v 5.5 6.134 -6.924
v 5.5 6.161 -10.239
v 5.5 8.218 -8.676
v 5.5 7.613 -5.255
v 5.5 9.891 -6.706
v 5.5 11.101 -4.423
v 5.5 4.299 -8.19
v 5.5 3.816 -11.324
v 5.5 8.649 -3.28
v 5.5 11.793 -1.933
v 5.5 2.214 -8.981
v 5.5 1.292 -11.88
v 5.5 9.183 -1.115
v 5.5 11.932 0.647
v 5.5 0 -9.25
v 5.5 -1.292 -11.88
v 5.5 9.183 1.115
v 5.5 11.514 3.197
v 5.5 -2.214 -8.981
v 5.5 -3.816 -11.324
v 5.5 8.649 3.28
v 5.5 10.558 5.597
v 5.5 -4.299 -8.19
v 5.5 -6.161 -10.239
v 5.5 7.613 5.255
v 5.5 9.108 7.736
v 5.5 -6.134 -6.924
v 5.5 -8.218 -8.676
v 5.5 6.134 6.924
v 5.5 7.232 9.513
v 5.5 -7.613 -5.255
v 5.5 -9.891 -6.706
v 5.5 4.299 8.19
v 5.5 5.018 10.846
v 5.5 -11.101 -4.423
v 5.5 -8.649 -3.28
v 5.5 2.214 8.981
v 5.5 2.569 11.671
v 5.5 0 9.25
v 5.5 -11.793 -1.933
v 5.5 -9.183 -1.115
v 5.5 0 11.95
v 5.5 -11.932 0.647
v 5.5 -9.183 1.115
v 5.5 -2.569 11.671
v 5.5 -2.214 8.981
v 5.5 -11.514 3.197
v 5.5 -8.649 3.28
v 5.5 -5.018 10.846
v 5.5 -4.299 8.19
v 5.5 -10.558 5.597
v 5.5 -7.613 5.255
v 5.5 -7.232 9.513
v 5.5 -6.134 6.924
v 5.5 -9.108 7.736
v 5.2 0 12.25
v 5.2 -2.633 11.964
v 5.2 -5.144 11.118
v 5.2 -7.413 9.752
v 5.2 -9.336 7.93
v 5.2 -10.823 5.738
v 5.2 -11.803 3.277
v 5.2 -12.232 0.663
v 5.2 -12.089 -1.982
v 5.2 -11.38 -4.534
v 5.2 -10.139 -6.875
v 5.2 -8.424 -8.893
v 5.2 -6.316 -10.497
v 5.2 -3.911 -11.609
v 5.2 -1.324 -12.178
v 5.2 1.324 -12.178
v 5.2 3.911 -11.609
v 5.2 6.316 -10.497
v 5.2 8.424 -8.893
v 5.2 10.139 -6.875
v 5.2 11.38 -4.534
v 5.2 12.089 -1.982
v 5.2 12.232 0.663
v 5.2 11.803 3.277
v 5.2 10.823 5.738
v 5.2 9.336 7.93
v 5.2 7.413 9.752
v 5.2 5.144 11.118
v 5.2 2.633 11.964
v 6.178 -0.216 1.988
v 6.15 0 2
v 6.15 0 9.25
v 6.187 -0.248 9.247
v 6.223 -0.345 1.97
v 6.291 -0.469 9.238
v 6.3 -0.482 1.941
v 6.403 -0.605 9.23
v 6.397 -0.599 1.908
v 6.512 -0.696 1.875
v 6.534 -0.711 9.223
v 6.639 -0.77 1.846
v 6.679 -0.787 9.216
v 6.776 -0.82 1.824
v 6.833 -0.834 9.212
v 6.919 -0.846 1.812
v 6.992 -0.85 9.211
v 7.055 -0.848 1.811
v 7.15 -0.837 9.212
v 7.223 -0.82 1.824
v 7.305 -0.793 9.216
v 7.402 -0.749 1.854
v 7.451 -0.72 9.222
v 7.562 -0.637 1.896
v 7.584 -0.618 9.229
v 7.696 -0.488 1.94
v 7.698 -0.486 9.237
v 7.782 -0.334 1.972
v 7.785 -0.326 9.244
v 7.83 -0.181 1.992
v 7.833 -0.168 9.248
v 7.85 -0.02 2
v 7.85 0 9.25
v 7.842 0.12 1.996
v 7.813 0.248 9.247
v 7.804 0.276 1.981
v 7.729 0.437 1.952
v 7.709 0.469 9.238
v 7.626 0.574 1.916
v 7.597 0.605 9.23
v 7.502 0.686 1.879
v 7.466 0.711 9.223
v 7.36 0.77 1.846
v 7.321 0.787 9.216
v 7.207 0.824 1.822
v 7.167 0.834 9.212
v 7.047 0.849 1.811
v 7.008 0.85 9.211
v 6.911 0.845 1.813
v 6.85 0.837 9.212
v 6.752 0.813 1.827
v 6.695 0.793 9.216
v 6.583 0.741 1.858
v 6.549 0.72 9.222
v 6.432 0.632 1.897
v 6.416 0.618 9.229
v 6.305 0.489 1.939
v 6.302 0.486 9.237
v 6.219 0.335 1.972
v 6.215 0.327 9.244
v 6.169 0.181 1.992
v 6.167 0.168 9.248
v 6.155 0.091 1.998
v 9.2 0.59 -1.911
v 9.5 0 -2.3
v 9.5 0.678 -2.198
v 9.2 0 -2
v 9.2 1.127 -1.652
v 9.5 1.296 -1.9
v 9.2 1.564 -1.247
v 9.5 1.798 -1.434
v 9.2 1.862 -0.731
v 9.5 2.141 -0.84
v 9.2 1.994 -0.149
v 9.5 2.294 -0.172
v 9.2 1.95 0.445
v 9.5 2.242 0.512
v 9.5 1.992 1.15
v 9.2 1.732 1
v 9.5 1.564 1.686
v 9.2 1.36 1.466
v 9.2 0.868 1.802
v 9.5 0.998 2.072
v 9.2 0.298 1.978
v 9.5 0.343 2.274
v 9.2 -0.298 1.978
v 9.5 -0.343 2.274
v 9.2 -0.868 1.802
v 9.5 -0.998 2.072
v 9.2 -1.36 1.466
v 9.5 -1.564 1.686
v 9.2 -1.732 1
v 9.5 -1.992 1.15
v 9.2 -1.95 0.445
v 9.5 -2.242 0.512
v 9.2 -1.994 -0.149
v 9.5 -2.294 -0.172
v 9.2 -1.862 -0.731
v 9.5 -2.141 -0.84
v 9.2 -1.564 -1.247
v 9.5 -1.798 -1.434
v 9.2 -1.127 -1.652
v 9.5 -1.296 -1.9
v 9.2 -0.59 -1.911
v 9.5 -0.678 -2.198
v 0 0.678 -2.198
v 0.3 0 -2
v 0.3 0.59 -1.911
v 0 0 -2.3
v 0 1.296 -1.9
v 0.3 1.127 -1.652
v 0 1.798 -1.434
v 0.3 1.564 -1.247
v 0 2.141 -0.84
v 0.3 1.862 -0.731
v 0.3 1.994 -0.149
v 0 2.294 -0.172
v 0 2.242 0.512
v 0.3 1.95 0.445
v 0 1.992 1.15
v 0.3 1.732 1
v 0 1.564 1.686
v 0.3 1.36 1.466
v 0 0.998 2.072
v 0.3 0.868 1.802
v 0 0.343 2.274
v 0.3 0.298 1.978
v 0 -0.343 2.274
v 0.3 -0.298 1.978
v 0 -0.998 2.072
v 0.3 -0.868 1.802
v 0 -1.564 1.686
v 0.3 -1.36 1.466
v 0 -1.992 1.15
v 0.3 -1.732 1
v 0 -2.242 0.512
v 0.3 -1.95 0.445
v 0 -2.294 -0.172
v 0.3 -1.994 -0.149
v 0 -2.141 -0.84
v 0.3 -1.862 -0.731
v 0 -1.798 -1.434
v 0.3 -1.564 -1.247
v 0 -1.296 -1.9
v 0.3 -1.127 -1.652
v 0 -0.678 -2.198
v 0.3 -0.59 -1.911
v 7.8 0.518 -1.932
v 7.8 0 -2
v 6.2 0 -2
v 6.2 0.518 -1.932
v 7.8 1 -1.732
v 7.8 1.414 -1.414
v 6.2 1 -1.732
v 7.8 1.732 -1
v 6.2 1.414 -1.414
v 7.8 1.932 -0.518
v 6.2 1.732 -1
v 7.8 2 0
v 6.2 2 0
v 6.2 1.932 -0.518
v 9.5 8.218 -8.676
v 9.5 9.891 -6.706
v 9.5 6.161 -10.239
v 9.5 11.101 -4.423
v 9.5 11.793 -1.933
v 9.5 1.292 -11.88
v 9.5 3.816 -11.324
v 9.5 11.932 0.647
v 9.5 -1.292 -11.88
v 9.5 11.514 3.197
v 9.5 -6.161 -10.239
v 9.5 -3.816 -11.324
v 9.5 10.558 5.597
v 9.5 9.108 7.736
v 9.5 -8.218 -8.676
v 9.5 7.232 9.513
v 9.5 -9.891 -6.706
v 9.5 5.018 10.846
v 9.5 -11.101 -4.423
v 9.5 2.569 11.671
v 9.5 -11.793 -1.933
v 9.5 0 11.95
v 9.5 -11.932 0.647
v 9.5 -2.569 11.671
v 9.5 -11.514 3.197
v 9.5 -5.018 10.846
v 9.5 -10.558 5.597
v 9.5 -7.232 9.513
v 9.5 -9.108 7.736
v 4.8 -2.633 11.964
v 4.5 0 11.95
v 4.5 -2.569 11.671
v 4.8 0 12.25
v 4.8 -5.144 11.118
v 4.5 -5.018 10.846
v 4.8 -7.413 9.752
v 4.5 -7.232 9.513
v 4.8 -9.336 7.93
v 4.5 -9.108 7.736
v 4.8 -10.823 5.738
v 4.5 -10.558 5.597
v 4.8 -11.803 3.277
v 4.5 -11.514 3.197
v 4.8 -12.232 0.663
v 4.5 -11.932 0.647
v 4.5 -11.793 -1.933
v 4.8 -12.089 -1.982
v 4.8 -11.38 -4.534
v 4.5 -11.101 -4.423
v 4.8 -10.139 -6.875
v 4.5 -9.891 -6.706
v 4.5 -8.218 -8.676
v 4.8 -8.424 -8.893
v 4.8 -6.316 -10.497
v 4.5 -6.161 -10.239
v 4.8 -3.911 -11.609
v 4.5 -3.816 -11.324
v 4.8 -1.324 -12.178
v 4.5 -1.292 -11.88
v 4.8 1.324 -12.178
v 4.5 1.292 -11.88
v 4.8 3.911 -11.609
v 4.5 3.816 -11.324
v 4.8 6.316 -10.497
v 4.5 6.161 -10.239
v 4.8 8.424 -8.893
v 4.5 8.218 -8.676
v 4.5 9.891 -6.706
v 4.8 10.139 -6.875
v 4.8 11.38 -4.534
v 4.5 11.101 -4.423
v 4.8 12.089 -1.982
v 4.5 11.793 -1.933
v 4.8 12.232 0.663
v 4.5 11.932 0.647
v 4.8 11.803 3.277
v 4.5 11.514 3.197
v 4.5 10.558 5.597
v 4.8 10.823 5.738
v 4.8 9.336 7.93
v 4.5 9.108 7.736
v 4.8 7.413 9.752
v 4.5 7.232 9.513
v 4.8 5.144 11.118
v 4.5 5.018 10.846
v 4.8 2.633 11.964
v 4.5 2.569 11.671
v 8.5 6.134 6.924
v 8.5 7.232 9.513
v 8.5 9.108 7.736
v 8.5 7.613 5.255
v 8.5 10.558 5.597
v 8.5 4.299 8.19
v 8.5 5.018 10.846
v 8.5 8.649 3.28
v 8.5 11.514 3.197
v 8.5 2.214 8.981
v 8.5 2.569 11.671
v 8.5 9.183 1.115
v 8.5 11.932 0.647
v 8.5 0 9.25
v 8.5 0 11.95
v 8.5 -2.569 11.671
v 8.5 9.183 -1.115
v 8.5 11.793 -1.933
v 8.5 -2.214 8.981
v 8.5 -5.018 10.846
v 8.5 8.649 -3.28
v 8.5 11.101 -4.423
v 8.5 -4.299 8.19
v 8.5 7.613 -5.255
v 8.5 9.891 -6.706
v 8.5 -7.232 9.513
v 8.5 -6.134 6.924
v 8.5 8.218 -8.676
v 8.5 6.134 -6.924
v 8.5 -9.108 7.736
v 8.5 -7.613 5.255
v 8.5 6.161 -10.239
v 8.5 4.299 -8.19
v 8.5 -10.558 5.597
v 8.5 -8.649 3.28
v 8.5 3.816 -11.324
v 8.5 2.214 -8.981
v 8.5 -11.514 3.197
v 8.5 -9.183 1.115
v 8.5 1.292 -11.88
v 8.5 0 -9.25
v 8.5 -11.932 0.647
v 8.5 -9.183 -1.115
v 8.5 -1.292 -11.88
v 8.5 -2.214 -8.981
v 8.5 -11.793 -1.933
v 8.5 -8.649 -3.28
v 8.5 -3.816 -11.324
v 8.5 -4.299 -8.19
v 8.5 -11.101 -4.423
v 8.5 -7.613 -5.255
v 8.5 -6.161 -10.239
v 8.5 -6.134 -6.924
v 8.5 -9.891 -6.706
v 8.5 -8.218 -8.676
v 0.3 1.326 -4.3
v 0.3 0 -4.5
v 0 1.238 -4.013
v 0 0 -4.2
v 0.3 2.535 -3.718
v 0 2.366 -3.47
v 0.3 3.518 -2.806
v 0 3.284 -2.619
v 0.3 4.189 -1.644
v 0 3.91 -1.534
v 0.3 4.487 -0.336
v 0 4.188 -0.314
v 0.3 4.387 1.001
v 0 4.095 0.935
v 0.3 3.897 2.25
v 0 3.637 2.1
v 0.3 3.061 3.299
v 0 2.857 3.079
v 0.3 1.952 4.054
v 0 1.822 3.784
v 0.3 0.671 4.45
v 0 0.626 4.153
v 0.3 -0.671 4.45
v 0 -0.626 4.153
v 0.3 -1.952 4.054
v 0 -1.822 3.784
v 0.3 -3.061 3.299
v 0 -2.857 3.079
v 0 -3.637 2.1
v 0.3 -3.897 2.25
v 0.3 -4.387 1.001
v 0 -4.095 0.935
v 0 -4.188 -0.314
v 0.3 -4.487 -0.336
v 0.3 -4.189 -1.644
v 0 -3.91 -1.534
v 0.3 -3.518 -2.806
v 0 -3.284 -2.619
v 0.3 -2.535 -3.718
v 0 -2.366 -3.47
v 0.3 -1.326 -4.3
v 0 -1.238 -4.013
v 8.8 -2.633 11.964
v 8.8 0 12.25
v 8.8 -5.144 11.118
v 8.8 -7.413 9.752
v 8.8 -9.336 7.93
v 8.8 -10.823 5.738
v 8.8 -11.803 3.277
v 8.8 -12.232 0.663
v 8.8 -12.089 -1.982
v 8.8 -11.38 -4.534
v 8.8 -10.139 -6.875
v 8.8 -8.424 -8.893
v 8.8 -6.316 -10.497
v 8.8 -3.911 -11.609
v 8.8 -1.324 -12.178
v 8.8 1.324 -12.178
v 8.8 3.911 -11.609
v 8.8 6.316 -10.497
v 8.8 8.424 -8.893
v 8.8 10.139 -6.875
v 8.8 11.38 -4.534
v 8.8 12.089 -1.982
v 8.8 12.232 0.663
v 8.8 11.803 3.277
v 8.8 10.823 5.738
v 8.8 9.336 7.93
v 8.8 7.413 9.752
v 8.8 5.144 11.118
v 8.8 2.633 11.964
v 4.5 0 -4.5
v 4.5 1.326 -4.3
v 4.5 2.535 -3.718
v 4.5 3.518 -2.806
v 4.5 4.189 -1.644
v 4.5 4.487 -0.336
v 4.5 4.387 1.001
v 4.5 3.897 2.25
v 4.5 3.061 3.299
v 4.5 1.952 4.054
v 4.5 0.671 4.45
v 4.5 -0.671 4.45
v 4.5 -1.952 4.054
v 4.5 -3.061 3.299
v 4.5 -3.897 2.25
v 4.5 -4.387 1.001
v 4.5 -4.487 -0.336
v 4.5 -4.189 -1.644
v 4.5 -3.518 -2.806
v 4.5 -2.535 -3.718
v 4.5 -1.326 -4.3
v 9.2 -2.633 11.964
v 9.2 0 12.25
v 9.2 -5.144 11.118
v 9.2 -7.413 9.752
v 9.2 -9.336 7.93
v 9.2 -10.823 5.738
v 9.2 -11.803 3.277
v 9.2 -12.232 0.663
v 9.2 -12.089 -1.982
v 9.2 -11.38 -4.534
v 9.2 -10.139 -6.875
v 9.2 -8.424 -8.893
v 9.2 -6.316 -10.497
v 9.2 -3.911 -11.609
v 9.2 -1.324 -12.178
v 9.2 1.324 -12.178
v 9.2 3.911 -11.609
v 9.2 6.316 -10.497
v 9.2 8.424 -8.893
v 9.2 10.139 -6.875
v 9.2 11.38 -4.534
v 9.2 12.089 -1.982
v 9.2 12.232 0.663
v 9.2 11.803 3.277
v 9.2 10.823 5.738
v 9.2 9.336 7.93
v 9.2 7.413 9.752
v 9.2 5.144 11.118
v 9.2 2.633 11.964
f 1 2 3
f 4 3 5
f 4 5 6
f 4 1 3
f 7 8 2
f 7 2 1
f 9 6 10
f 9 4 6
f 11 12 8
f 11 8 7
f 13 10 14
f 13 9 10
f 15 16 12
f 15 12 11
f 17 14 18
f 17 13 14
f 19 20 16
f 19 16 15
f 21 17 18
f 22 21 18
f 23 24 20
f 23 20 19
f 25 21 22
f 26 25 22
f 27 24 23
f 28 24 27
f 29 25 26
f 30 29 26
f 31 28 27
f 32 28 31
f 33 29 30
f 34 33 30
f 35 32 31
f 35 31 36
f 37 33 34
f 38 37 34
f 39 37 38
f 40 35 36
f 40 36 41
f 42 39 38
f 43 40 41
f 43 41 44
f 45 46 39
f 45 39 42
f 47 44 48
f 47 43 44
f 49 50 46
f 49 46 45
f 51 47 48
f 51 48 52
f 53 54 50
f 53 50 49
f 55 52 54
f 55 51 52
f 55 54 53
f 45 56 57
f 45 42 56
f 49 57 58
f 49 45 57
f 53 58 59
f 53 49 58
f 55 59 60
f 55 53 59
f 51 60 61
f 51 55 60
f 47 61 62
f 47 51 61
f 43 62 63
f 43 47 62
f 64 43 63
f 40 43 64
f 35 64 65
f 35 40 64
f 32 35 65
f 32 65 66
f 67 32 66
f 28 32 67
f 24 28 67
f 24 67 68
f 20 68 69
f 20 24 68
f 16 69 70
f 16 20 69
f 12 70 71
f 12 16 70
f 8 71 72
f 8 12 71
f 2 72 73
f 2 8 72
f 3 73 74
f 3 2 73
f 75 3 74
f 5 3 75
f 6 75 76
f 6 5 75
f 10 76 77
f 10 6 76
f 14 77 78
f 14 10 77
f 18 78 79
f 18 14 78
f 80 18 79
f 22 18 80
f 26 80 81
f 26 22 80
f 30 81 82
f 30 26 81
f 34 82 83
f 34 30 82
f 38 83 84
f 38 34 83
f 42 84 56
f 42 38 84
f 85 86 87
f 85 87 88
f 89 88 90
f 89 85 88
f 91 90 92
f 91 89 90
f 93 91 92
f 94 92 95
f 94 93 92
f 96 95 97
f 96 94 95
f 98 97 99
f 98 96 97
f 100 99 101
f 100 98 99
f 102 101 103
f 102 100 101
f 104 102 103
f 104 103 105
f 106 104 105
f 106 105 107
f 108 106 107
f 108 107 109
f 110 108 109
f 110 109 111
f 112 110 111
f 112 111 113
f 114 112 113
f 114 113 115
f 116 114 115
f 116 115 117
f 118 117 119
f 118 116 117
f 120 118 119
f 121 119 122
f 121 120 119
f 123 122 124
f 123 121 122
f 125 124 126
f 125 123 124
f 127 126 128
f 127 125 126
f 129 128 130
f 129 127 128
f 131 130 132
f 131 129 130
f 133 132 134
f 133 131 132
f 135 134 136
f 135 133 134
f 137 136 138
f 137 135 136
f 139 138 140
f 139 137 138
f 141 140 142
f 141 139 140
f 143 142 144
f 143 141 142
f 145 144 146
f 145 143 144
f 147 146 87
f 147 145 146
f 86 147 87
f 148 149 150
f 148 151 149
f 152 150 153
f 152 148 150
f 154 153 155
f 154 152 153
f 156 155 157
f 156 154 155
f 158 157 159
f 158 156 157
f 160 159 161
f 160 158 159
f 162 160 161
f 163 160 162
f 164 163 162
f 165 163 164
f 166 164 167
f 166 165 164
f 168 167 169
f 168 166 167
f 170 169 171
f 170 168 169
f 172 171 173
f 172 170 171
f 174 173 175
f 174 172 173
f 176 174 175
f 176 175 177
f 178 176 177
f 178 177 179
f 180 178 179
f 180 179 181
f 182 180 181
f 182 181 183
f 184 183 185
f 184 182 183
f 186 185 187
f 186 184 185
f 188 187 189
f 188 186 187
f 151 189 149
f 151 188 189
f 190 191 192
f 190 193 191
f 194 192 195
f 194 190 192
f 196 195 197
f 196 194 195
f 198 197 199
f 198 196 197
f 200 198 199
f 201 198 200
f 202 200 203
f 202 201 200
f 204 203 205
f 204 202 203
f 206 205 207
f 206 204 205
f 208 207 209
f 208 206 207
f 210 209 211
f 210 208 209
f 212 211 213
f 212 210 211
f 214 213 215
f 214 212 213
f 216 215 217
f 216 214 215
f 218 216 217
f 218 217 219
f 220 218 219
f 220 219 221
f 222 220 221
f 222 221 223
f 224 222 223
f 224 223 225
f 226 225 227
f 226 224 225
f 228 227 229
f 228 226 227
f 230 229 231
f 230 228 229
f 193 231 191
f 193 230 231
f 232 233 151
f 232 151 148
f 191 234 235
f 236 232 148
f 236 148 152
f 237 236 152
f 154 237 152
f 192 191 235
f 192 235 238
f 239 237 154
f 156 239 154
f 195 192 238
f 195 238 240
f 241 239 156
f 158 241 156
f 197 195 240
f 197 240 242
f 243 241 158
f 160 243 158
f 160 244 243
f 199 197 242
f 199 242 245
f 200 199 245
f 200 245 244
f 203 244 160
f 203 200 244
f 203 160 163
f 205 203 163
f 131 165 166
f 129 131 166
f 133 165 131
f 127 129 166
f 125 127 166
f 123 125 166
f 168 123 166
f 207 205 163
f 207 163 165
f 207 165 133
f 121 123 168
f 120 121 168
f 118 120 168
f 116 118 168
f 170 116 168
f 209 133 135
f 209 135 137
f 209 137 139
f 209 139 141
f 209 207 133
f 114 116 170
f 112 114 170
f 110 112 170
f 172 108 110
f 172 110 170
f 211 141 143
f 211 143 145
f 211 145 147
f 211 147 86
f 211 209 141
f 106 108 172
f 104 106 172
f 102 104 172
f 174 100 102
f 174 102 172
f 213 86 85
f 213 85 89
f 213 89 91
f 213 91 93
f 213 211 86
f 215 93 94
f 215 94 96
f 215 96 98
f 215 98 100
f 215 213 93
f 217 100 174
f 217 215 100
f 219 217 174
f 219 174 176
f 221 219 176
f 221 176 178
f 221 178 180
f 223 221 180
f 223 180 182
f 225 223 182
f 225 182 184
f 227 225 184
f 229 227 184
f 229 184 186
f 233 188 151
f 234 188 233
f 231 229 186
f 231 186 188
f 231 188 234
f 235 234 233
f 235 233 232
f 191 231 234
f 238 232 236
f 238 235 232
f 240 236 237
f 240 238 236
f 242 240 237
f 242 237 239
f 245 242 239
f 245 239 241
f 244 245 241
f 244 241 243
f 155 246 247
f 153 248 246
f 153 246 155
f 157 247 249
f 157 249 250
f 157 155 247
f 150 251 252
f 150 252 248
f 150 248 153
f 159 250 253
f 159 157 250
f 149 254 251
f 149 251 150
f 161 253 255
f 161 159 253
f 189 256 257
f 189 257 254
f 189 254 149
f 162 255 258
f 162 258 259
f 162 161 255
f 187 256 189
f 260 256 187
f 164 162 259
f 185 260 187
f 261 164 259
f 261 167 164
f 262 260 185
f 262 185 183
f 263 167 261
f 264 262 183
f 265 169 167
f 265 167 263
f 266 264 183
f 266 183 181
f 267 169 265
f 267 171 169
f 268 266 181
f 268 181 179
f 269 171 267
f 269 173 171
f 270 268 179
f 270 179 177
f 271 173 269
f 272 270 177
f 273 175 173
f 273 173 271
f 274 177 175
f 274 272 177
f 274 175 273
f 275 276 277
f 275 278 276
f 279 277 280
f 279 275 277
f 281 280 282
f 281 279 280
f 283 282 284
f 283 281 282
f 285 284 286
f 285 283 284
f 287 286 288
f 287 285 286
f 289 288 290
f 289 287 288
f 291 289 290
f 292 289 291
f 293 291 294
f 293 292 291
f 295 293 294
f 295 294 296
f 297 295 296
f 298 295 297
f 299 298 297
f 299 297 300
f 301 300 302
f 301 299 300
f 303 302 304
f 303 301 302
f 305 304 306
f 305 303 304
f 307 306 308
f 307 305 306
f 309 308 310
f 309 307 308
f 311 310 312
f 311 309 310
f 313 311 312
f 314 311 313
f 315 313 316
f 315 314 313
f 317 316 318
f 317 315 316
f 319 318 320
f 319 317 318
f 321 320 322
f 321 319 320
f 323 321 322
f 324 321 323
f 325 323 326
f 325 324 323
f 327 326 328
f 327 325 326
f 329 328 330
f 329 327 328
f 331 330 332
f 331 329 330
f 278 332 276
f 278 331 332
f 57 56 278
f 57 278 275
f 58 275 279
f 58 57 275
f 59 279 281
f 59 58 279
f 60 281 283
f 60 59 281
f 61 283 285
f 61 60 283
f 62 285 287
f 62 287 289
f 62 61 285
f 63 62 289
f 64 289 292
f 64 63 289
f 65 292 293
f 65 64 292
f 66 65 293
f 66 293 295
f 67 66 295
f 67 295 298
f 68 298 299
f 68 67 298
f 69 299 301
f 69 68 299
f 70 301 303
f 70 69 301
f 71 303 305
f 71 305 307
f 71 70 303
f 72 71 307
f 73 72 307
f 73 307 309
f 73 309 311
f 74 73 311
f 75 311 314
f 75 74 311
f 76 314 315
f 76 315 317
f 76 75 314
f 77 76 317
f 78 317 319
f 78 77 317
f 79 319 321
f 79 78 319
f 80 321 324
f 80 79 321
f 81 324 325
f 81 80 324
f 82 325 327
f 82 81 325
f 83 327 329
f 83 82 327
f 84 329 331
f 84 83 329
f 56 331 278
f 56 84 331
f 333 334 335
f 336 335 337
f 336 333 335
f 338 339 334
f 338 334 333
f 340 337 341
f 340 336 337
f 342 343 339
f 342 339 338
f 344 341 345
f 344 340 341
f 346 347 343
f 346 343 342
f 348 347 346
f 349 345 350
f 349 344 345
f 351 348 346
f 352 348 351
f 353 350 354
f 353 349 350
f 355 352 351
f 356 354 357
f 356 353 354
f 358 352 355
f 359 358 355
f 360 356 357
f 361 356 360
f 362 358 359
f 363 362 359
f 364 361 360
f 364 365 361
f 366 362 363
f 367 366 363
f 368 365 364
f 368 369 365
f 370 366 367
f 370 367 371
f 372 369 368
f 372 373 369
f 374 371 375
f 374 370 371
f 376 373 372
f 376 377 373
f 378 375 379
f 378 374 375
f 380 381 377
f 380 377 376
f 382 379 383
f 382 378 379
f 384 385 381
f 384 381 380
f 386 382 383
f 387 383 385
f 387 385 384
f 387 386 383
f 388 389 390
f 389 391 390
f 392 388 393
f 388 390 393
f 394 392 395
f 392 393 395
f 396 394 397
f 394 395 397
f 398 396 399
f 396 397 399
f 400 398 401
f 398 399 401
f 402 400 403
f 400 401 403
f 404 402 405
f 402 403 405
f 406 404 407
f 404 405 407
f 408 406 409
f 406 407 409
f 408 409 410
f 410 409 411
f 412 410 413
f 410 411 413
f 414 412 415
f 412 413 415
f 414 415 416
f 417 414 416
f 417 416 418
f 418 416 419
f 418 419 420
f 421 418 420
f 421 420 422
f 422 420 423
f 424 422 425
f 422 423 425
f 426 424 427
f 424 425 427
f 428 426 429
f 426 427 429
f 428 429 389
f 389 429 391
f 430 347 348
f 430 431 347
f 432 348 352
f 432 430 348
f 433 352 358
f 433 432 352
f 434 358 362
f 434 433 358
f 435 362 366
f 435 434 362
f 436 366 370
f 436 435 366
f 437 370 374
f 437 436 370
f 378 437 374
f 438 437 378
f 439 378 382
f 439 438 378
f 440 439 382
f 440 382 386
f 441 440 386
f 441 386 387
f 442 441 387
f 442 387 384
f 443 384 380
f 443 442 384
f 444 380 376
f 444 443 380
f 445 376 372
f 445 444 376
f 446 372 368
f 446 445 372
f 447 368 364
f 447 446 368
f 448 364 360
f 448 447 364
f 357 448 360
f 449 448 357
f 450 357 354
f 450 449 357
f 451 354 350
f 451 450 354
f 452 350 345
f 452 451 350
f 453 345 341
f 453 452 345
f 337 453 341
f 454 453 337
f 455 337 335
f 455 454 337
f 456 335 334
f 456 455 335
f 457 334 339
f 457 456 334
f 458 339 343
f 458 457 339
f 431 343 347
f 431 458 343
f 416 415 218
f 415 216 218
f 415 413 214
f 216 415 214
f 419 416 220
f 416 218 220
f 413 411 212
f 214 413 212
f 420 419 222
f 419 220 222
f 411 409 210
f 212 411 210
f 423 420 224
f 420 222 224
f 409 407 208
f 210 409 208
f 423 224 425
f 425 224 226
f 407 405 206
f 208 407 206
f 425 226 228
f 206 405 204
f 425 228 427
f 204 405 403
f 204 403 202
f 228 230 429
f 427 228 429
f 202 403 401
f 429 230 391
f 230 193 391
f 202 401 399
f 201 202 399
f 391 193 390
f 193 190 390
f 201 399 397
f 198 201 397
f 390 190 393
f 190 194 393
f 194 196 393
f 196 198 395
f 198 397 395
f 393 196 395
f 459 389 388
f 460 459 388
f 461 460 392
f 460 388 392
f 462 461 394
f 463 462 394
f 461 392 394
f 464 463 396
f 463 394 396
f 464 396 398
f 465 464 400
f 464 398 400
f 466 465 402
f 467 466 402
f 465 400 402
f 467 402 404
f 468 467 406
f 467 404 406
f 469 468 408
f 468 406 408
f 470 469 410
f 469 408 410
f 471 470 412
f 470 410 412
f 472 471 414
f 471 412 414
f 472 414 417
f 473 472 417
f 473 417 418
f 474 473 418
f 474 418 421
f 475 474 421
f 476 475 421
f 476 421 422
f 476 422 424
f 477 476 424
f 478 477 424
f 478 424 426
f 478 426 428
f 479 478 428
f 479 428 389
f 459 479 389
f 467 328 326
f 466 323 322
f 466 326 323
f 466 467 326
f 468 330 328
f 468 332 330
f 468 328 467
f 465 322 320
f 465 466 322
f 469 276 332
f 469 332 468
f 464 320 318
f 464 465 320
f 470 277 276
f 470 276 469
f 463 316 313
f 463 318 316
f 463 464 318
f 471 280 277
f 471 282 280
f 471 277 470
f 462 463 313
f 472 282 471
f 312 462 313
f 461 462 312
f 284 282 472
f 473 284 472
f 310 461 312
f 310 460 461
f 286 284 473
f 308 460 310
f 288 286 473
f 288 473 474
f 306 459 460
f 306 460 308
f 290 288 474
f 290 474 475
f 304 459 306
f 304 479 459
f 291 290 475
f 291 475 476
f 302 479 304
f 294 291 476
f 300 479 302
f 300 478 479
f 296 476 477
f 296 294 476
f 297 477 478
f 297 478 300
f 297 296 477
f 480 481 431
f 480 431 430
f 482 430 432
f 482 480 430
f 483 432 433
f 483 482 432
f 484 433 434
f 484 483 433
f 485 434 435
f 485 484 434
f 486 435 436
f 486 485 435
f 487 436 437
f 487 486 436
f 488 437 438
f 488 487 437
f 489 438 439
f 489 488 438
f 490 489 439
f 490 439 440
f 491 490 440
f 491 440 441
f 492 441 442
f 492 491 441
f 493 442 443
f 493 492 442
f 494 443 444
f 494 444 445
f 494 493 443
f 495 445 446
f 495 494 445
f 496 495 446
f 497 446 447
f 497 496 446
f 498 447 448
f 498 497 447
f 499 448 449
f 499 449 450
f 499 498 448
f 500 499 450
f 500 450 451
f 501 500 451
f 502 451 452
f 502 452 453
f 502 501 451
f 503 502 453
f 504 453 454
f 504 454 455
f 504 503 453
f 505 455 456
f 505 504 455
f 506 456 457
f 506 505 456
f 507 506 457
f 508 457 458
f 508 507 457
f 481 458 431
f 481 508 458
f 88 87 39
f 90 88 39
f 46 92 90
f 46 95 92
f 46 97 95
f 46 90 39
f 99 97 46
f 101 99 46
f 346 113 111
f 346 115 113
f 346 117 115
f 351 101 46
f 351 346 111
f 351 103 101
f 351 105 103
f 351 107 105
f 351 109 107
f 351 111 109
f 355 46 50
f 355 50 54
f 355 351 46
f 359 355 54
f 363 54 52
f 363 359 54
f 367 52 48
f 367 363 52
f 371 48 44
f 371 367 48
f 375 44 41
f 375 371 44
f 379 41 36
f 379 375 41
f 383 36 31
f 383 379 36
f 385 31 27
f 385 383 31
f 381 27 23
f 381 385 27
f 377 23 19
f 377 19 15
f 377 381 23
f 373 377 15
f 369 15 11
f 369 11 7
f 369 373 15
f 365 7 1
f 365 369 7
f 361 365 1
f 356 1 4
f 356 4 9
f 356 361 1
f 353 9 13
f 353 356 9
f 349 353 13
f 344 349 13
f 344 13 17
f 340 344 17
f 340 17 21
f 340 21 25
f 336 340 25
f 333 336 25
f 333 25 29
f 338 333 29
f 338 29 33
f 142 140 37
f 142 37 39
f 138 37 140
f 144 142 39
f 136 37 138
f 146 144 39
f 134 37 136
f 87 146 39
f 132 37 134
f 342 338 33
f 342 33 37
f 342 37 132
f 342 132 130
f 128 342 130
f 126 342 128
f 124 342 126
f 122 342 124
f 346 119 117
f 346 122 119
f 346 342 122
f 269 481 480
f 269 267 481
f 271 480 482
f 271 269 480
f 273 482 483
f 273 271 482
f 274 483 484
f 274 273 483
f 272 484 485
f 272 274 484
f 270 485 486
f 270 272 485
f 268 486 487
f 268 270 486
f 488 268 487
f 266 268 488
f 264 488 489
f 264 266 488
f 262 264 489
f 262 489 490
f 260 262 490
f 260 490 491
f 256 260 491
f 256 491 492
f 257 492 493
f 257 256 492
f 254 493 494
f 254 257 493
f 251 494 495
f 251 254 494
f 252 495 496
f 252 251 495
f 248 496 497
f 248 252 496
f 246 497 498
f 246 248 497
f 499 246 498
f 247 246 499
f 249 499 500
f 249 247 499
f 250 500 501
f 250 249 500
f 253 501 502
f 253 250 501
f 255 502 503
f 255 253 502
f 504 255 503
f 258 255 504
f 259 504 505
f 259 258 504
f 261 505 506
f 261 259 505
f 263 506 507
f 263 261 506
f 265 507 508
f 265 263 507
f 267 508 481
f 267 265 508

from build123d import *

# Parameters (mm, degrees)
SCHNITT_LINEAR_START                    = -20
SCHNITT_LINEAR_AUSTRAGEN1_OUTLINE_R     = 4.5
SCHNITT_LINEAR_AUSTRAGEN1_OUTLINE_R_2   = 2
SCHNITT_LINEAR_AUSTRAGEN1_DEPTH         = 6.199999898
SCHNITT_LINEAR_START_2                  = -12.199999898
SCHNITT_LINEAR_AUSTRAGEN1_2_OUTLINE_R   = 4.5
SCHNITT_LINEAR_AUSTRAGEN1_2_OUTLINE_R_2 = 2
SCHNITT_LINEAR_AUSTRAGEN1_2_DEPTH       = 6.199999898
SCHNITT_LINEAR_START_3                  = 6.199999898
SCHNITT_LINEAR_AUSTRAGEN1_3_OUTLINE_R   = 4.5
SCHNITT_LINEAR_AUSTRAGEN1_3_OUTLINE_R_2 = 2
SCHNITT_LINEAR_AUSTRAGEN1_3_DEPTH       = 1.600000204
SCHNITT_LINEAR_START_4                  = 1
SCHNITT_LINEAR_AUSTRAGEN1_4_OUTLINE_R   = 0.8
SCHNITT_LINEAR_AUSTRAGEN1_4_DEPTH       = 5
SKIZZE5_R                               = 0.85
SCHNITT_LINEAR_AUSTRAGEN2_DEPTH         = 30
SCHNITT_LINEAR_START_5                  = -4.5
SKIZZE6_R                               = 4.5
SCHNITT_LINEAR_AUSTRAGEN3_DEPTH         = 4.5
FASE1_SIZE                              = 0.3


with BuildPart() as part:
    # Schnitt-Linear austragen1: read off the stored shape, not the designer's step
    # Schnitt-Linear austragen1 outline → Schnitt-Linear austragen1 (new body)
    with BuildSketch(Plane(origin=(20, 0, 0), x_dir=(0, 0, -1), z_dir=(1, 0, 0)).offset(SCHNITT_LINEAR_START)):
        Circle(SCHNITT_LINEAR_AUSTRAGEN1_OUTLINE_R)
        Circle(SCHNITT_LINEAR_AUSTRAGEN1_OUTLINE_R_2, mode=Mode.SUBTRACT)
    extrude(amount=SCHNITT_LINEAR_AUSTRAGEN1_DEPTH)



with BuildPart() as body_2:
    # Schnitt-Linear austragen1 2 outline → Schnitt-Linear austragen1 2 (new body)
    with BuildSketch(Plane(origin=(20, 0, 0), x_dir=(0, 0, -1), z_dir=(1, 0, 0)).offset(SCHNITT_LINEAR_START_2)):
        Circle(SCHNITT_LINEAR_AUSTRAGEN1_2_OUTLINE_R)
        Circle(SCHNITT_LINEAR_AUSTRAGEN1_2_OUTLINE_R_2, mode=Mode.SUBTRACT)
    extrude(amount=SCHNITT_LINEAR_AUSTRAGEN1_2_DEPTH)


with BuildPart() as part_1:
    add(part.part)

    add(body_2.part)  # Schnitt-Linear austragen1 3 merges body 2
    # Schnitt-Linear austragen1 3 outline → Schnitt-Linear austragen1 3 (add)
    with BuildSketch(Plane.YZ.offset(SCHNITT_LINEAR_START_3)):
        Circle(SCHNITT_LINEAR_AUSTRAGEN1_3_OUTLINE_R)
        Circle(SCHNITT_LINEAR_AUSTRAGEN1_3_OUTLINE_R_2, mode=Mode.SUBTRACT)
    extrude(amount=SCHNITT_LINEAR_AUSTRAGEN1_3_DEPTH)

    # Schnitt-Linear austragen1 4 outline → Schnitt-Linear austragen1 4 (cut)
    with BuildSketch(Plane.XY.offset(SCHNITT_LINEAR_START_4)):
        with Locations((7, 0)):
            Circle(SCHNITT_LINEAR_AUSTRAGEN1_4_OUTLINE_R)
    extrude(amount=SCHNITT_LINEAR_AUSTRAGEN1_4_DEPTH, mode=Mode.SUBTRACT)

    # Skizze4 → Rotation1 (revolve)
    with BuildSketch(Plane(origin=(0, 0, 0), x_dir=(1, 0, 0), z_dir=(0, 1, 0))):
        Polygon((4.5, -4), (4.5, -12.25), (5.5, -12.25), (5.5, -9.25), (8.5, -9.25), (8.5, -12.25), (9.5, -12.25), (9.5, -4), align=None)
    revolve(axis=Axis((2.33899179, 0, 0), (1, 0, 0)))

    # Skizze5 → Schnitt-Linear austragen2 (cut)
    with BuildSketch(Plane.XY):
        with Locations(Location((7, 0, 0), (0, 0, 180))):
            Circle(SKIZZE5_R)
    extrude(amount=SCHNITT_LINEAR_AUSTRAGEN2_DEPTH, mode=Mode.SUBTRACT)

    # Skizze6 → Schnitt-Linear austragen3 (cut)
    with BuildSketch(Plane(origin=(14, 0, 0), x_dir=(0, 0, -1), z_dir=(1, 0, 0)).offset(SCHNITT_LINEAR_START_5)):
        with Locations(Location((0, 0, 0), (0, 0, 180))):
            Circle(SKIZZE6_R)
    extrude(amount=SCHNITT_LINEAR_AUSTRAGEN3_DEPTH, mode=Mode.SUBTRACT)

    # Fase1
    # the kernel refuses this chamfer: 0.3 mm, written as the material it takes off along each edge
    with BuildSketch(Plane(origin=(4.5, 0, 0), x_dir=(0, 0, 1), z_dir=(0, 1, 0))) as fase1_piece_1:
        Polygon((12.25 - FASE1_SIZE, 0), (12.25, FASE1_SIZE), (12.25, 0), align=None)
    revolve(axis=Axis((4.5, 0, 0), (1, 0, 0)), mode=Mode.SUBTRACT)
    with BuildSketch(Plane(origin=(5.5, 0, 0), x_dir=(0, 0, 1), z_dir=(0, 1, 0))) as fase1_piece_2:
        Polygon((12.25, -FASE1_SIZE), (12.25 - FASE1_SIZE, 0), (12.25, 0), align=None)
    revolve(axis=Axis((5.5, 0, 0), (1, 0, 0)), mode=Mode.SUBTRACT)
    with BuildSketch(Plane(origin=(8.5, 0, 0), x_dir=(0, 0, 1), z_dir=(0, 1, 0))) as fase1_piece_3:
        Polygon((12.25 - FASE1_SIZE, 0), (12.25, FASE1_SIZE), (12.25, 0), align=None)
    revolve(axis=Axis((8.5, 0, 0), (1, 0, 0)), mode=Mode.SUBTRACT)
    with BuildSketch(Plane(origin=(9.5, 0, 0), x_dir=(0, 0, 1), z_dir=(0, 1, 0))) as fase1_piece_4:
        Polygon((12.25, -FASE1_SIZE), (12.25 - FASE1_SIZE, 0), (12.25, 0), align=None)
    revolve(axis=Axis((9.5, 0, 0), (1, 0, 0)), mode=Mode.SUBTRACT)
    with BuildSketch(Plane(origin=(9.5, 0, 0), x_dir=(0, 0, -1), z_dir=(0, -1, 0))) as fase1_piece_5:
        Polygon((2 + FASE1_SIZE, 0), (2, -FASE1_SIZE), (2, 0), align=None)
    revolve(axis=Axis((9.5, 0, 0), (1, 0, 0)), mode=Mode.SUBTRACT)
    with BuildSketch(Plane(origin=(0, 0, 0), x_dir=(0, 0, -1), z_dir=(0, -1, 0))) as fase1_piece_6:
        Polygon((2, FASE1_SIZE), (2 + FASE1_SIZE, 0), (2, 0), align=None)
    revolve(axis=Axis((0, 0, 0), (1, 0, 0)), mode=Mode.SUBTRACT)
    with BuildSketch(Plane(origin=(0, 0, 0), x_dir=(0, 0, -1), z_dir=(0, -1, 0))) as fase1_piece_7:
        Polygon((4.5, FASE1_SIZE), (4.5 - FASE1_SIZE, 0), (4.5, 0), align=None)
    revolve(axis=Axis((0, 0, 0), (1, 0, 0)), mode=Mode.SUBTRACT)


solid = part_1.part
